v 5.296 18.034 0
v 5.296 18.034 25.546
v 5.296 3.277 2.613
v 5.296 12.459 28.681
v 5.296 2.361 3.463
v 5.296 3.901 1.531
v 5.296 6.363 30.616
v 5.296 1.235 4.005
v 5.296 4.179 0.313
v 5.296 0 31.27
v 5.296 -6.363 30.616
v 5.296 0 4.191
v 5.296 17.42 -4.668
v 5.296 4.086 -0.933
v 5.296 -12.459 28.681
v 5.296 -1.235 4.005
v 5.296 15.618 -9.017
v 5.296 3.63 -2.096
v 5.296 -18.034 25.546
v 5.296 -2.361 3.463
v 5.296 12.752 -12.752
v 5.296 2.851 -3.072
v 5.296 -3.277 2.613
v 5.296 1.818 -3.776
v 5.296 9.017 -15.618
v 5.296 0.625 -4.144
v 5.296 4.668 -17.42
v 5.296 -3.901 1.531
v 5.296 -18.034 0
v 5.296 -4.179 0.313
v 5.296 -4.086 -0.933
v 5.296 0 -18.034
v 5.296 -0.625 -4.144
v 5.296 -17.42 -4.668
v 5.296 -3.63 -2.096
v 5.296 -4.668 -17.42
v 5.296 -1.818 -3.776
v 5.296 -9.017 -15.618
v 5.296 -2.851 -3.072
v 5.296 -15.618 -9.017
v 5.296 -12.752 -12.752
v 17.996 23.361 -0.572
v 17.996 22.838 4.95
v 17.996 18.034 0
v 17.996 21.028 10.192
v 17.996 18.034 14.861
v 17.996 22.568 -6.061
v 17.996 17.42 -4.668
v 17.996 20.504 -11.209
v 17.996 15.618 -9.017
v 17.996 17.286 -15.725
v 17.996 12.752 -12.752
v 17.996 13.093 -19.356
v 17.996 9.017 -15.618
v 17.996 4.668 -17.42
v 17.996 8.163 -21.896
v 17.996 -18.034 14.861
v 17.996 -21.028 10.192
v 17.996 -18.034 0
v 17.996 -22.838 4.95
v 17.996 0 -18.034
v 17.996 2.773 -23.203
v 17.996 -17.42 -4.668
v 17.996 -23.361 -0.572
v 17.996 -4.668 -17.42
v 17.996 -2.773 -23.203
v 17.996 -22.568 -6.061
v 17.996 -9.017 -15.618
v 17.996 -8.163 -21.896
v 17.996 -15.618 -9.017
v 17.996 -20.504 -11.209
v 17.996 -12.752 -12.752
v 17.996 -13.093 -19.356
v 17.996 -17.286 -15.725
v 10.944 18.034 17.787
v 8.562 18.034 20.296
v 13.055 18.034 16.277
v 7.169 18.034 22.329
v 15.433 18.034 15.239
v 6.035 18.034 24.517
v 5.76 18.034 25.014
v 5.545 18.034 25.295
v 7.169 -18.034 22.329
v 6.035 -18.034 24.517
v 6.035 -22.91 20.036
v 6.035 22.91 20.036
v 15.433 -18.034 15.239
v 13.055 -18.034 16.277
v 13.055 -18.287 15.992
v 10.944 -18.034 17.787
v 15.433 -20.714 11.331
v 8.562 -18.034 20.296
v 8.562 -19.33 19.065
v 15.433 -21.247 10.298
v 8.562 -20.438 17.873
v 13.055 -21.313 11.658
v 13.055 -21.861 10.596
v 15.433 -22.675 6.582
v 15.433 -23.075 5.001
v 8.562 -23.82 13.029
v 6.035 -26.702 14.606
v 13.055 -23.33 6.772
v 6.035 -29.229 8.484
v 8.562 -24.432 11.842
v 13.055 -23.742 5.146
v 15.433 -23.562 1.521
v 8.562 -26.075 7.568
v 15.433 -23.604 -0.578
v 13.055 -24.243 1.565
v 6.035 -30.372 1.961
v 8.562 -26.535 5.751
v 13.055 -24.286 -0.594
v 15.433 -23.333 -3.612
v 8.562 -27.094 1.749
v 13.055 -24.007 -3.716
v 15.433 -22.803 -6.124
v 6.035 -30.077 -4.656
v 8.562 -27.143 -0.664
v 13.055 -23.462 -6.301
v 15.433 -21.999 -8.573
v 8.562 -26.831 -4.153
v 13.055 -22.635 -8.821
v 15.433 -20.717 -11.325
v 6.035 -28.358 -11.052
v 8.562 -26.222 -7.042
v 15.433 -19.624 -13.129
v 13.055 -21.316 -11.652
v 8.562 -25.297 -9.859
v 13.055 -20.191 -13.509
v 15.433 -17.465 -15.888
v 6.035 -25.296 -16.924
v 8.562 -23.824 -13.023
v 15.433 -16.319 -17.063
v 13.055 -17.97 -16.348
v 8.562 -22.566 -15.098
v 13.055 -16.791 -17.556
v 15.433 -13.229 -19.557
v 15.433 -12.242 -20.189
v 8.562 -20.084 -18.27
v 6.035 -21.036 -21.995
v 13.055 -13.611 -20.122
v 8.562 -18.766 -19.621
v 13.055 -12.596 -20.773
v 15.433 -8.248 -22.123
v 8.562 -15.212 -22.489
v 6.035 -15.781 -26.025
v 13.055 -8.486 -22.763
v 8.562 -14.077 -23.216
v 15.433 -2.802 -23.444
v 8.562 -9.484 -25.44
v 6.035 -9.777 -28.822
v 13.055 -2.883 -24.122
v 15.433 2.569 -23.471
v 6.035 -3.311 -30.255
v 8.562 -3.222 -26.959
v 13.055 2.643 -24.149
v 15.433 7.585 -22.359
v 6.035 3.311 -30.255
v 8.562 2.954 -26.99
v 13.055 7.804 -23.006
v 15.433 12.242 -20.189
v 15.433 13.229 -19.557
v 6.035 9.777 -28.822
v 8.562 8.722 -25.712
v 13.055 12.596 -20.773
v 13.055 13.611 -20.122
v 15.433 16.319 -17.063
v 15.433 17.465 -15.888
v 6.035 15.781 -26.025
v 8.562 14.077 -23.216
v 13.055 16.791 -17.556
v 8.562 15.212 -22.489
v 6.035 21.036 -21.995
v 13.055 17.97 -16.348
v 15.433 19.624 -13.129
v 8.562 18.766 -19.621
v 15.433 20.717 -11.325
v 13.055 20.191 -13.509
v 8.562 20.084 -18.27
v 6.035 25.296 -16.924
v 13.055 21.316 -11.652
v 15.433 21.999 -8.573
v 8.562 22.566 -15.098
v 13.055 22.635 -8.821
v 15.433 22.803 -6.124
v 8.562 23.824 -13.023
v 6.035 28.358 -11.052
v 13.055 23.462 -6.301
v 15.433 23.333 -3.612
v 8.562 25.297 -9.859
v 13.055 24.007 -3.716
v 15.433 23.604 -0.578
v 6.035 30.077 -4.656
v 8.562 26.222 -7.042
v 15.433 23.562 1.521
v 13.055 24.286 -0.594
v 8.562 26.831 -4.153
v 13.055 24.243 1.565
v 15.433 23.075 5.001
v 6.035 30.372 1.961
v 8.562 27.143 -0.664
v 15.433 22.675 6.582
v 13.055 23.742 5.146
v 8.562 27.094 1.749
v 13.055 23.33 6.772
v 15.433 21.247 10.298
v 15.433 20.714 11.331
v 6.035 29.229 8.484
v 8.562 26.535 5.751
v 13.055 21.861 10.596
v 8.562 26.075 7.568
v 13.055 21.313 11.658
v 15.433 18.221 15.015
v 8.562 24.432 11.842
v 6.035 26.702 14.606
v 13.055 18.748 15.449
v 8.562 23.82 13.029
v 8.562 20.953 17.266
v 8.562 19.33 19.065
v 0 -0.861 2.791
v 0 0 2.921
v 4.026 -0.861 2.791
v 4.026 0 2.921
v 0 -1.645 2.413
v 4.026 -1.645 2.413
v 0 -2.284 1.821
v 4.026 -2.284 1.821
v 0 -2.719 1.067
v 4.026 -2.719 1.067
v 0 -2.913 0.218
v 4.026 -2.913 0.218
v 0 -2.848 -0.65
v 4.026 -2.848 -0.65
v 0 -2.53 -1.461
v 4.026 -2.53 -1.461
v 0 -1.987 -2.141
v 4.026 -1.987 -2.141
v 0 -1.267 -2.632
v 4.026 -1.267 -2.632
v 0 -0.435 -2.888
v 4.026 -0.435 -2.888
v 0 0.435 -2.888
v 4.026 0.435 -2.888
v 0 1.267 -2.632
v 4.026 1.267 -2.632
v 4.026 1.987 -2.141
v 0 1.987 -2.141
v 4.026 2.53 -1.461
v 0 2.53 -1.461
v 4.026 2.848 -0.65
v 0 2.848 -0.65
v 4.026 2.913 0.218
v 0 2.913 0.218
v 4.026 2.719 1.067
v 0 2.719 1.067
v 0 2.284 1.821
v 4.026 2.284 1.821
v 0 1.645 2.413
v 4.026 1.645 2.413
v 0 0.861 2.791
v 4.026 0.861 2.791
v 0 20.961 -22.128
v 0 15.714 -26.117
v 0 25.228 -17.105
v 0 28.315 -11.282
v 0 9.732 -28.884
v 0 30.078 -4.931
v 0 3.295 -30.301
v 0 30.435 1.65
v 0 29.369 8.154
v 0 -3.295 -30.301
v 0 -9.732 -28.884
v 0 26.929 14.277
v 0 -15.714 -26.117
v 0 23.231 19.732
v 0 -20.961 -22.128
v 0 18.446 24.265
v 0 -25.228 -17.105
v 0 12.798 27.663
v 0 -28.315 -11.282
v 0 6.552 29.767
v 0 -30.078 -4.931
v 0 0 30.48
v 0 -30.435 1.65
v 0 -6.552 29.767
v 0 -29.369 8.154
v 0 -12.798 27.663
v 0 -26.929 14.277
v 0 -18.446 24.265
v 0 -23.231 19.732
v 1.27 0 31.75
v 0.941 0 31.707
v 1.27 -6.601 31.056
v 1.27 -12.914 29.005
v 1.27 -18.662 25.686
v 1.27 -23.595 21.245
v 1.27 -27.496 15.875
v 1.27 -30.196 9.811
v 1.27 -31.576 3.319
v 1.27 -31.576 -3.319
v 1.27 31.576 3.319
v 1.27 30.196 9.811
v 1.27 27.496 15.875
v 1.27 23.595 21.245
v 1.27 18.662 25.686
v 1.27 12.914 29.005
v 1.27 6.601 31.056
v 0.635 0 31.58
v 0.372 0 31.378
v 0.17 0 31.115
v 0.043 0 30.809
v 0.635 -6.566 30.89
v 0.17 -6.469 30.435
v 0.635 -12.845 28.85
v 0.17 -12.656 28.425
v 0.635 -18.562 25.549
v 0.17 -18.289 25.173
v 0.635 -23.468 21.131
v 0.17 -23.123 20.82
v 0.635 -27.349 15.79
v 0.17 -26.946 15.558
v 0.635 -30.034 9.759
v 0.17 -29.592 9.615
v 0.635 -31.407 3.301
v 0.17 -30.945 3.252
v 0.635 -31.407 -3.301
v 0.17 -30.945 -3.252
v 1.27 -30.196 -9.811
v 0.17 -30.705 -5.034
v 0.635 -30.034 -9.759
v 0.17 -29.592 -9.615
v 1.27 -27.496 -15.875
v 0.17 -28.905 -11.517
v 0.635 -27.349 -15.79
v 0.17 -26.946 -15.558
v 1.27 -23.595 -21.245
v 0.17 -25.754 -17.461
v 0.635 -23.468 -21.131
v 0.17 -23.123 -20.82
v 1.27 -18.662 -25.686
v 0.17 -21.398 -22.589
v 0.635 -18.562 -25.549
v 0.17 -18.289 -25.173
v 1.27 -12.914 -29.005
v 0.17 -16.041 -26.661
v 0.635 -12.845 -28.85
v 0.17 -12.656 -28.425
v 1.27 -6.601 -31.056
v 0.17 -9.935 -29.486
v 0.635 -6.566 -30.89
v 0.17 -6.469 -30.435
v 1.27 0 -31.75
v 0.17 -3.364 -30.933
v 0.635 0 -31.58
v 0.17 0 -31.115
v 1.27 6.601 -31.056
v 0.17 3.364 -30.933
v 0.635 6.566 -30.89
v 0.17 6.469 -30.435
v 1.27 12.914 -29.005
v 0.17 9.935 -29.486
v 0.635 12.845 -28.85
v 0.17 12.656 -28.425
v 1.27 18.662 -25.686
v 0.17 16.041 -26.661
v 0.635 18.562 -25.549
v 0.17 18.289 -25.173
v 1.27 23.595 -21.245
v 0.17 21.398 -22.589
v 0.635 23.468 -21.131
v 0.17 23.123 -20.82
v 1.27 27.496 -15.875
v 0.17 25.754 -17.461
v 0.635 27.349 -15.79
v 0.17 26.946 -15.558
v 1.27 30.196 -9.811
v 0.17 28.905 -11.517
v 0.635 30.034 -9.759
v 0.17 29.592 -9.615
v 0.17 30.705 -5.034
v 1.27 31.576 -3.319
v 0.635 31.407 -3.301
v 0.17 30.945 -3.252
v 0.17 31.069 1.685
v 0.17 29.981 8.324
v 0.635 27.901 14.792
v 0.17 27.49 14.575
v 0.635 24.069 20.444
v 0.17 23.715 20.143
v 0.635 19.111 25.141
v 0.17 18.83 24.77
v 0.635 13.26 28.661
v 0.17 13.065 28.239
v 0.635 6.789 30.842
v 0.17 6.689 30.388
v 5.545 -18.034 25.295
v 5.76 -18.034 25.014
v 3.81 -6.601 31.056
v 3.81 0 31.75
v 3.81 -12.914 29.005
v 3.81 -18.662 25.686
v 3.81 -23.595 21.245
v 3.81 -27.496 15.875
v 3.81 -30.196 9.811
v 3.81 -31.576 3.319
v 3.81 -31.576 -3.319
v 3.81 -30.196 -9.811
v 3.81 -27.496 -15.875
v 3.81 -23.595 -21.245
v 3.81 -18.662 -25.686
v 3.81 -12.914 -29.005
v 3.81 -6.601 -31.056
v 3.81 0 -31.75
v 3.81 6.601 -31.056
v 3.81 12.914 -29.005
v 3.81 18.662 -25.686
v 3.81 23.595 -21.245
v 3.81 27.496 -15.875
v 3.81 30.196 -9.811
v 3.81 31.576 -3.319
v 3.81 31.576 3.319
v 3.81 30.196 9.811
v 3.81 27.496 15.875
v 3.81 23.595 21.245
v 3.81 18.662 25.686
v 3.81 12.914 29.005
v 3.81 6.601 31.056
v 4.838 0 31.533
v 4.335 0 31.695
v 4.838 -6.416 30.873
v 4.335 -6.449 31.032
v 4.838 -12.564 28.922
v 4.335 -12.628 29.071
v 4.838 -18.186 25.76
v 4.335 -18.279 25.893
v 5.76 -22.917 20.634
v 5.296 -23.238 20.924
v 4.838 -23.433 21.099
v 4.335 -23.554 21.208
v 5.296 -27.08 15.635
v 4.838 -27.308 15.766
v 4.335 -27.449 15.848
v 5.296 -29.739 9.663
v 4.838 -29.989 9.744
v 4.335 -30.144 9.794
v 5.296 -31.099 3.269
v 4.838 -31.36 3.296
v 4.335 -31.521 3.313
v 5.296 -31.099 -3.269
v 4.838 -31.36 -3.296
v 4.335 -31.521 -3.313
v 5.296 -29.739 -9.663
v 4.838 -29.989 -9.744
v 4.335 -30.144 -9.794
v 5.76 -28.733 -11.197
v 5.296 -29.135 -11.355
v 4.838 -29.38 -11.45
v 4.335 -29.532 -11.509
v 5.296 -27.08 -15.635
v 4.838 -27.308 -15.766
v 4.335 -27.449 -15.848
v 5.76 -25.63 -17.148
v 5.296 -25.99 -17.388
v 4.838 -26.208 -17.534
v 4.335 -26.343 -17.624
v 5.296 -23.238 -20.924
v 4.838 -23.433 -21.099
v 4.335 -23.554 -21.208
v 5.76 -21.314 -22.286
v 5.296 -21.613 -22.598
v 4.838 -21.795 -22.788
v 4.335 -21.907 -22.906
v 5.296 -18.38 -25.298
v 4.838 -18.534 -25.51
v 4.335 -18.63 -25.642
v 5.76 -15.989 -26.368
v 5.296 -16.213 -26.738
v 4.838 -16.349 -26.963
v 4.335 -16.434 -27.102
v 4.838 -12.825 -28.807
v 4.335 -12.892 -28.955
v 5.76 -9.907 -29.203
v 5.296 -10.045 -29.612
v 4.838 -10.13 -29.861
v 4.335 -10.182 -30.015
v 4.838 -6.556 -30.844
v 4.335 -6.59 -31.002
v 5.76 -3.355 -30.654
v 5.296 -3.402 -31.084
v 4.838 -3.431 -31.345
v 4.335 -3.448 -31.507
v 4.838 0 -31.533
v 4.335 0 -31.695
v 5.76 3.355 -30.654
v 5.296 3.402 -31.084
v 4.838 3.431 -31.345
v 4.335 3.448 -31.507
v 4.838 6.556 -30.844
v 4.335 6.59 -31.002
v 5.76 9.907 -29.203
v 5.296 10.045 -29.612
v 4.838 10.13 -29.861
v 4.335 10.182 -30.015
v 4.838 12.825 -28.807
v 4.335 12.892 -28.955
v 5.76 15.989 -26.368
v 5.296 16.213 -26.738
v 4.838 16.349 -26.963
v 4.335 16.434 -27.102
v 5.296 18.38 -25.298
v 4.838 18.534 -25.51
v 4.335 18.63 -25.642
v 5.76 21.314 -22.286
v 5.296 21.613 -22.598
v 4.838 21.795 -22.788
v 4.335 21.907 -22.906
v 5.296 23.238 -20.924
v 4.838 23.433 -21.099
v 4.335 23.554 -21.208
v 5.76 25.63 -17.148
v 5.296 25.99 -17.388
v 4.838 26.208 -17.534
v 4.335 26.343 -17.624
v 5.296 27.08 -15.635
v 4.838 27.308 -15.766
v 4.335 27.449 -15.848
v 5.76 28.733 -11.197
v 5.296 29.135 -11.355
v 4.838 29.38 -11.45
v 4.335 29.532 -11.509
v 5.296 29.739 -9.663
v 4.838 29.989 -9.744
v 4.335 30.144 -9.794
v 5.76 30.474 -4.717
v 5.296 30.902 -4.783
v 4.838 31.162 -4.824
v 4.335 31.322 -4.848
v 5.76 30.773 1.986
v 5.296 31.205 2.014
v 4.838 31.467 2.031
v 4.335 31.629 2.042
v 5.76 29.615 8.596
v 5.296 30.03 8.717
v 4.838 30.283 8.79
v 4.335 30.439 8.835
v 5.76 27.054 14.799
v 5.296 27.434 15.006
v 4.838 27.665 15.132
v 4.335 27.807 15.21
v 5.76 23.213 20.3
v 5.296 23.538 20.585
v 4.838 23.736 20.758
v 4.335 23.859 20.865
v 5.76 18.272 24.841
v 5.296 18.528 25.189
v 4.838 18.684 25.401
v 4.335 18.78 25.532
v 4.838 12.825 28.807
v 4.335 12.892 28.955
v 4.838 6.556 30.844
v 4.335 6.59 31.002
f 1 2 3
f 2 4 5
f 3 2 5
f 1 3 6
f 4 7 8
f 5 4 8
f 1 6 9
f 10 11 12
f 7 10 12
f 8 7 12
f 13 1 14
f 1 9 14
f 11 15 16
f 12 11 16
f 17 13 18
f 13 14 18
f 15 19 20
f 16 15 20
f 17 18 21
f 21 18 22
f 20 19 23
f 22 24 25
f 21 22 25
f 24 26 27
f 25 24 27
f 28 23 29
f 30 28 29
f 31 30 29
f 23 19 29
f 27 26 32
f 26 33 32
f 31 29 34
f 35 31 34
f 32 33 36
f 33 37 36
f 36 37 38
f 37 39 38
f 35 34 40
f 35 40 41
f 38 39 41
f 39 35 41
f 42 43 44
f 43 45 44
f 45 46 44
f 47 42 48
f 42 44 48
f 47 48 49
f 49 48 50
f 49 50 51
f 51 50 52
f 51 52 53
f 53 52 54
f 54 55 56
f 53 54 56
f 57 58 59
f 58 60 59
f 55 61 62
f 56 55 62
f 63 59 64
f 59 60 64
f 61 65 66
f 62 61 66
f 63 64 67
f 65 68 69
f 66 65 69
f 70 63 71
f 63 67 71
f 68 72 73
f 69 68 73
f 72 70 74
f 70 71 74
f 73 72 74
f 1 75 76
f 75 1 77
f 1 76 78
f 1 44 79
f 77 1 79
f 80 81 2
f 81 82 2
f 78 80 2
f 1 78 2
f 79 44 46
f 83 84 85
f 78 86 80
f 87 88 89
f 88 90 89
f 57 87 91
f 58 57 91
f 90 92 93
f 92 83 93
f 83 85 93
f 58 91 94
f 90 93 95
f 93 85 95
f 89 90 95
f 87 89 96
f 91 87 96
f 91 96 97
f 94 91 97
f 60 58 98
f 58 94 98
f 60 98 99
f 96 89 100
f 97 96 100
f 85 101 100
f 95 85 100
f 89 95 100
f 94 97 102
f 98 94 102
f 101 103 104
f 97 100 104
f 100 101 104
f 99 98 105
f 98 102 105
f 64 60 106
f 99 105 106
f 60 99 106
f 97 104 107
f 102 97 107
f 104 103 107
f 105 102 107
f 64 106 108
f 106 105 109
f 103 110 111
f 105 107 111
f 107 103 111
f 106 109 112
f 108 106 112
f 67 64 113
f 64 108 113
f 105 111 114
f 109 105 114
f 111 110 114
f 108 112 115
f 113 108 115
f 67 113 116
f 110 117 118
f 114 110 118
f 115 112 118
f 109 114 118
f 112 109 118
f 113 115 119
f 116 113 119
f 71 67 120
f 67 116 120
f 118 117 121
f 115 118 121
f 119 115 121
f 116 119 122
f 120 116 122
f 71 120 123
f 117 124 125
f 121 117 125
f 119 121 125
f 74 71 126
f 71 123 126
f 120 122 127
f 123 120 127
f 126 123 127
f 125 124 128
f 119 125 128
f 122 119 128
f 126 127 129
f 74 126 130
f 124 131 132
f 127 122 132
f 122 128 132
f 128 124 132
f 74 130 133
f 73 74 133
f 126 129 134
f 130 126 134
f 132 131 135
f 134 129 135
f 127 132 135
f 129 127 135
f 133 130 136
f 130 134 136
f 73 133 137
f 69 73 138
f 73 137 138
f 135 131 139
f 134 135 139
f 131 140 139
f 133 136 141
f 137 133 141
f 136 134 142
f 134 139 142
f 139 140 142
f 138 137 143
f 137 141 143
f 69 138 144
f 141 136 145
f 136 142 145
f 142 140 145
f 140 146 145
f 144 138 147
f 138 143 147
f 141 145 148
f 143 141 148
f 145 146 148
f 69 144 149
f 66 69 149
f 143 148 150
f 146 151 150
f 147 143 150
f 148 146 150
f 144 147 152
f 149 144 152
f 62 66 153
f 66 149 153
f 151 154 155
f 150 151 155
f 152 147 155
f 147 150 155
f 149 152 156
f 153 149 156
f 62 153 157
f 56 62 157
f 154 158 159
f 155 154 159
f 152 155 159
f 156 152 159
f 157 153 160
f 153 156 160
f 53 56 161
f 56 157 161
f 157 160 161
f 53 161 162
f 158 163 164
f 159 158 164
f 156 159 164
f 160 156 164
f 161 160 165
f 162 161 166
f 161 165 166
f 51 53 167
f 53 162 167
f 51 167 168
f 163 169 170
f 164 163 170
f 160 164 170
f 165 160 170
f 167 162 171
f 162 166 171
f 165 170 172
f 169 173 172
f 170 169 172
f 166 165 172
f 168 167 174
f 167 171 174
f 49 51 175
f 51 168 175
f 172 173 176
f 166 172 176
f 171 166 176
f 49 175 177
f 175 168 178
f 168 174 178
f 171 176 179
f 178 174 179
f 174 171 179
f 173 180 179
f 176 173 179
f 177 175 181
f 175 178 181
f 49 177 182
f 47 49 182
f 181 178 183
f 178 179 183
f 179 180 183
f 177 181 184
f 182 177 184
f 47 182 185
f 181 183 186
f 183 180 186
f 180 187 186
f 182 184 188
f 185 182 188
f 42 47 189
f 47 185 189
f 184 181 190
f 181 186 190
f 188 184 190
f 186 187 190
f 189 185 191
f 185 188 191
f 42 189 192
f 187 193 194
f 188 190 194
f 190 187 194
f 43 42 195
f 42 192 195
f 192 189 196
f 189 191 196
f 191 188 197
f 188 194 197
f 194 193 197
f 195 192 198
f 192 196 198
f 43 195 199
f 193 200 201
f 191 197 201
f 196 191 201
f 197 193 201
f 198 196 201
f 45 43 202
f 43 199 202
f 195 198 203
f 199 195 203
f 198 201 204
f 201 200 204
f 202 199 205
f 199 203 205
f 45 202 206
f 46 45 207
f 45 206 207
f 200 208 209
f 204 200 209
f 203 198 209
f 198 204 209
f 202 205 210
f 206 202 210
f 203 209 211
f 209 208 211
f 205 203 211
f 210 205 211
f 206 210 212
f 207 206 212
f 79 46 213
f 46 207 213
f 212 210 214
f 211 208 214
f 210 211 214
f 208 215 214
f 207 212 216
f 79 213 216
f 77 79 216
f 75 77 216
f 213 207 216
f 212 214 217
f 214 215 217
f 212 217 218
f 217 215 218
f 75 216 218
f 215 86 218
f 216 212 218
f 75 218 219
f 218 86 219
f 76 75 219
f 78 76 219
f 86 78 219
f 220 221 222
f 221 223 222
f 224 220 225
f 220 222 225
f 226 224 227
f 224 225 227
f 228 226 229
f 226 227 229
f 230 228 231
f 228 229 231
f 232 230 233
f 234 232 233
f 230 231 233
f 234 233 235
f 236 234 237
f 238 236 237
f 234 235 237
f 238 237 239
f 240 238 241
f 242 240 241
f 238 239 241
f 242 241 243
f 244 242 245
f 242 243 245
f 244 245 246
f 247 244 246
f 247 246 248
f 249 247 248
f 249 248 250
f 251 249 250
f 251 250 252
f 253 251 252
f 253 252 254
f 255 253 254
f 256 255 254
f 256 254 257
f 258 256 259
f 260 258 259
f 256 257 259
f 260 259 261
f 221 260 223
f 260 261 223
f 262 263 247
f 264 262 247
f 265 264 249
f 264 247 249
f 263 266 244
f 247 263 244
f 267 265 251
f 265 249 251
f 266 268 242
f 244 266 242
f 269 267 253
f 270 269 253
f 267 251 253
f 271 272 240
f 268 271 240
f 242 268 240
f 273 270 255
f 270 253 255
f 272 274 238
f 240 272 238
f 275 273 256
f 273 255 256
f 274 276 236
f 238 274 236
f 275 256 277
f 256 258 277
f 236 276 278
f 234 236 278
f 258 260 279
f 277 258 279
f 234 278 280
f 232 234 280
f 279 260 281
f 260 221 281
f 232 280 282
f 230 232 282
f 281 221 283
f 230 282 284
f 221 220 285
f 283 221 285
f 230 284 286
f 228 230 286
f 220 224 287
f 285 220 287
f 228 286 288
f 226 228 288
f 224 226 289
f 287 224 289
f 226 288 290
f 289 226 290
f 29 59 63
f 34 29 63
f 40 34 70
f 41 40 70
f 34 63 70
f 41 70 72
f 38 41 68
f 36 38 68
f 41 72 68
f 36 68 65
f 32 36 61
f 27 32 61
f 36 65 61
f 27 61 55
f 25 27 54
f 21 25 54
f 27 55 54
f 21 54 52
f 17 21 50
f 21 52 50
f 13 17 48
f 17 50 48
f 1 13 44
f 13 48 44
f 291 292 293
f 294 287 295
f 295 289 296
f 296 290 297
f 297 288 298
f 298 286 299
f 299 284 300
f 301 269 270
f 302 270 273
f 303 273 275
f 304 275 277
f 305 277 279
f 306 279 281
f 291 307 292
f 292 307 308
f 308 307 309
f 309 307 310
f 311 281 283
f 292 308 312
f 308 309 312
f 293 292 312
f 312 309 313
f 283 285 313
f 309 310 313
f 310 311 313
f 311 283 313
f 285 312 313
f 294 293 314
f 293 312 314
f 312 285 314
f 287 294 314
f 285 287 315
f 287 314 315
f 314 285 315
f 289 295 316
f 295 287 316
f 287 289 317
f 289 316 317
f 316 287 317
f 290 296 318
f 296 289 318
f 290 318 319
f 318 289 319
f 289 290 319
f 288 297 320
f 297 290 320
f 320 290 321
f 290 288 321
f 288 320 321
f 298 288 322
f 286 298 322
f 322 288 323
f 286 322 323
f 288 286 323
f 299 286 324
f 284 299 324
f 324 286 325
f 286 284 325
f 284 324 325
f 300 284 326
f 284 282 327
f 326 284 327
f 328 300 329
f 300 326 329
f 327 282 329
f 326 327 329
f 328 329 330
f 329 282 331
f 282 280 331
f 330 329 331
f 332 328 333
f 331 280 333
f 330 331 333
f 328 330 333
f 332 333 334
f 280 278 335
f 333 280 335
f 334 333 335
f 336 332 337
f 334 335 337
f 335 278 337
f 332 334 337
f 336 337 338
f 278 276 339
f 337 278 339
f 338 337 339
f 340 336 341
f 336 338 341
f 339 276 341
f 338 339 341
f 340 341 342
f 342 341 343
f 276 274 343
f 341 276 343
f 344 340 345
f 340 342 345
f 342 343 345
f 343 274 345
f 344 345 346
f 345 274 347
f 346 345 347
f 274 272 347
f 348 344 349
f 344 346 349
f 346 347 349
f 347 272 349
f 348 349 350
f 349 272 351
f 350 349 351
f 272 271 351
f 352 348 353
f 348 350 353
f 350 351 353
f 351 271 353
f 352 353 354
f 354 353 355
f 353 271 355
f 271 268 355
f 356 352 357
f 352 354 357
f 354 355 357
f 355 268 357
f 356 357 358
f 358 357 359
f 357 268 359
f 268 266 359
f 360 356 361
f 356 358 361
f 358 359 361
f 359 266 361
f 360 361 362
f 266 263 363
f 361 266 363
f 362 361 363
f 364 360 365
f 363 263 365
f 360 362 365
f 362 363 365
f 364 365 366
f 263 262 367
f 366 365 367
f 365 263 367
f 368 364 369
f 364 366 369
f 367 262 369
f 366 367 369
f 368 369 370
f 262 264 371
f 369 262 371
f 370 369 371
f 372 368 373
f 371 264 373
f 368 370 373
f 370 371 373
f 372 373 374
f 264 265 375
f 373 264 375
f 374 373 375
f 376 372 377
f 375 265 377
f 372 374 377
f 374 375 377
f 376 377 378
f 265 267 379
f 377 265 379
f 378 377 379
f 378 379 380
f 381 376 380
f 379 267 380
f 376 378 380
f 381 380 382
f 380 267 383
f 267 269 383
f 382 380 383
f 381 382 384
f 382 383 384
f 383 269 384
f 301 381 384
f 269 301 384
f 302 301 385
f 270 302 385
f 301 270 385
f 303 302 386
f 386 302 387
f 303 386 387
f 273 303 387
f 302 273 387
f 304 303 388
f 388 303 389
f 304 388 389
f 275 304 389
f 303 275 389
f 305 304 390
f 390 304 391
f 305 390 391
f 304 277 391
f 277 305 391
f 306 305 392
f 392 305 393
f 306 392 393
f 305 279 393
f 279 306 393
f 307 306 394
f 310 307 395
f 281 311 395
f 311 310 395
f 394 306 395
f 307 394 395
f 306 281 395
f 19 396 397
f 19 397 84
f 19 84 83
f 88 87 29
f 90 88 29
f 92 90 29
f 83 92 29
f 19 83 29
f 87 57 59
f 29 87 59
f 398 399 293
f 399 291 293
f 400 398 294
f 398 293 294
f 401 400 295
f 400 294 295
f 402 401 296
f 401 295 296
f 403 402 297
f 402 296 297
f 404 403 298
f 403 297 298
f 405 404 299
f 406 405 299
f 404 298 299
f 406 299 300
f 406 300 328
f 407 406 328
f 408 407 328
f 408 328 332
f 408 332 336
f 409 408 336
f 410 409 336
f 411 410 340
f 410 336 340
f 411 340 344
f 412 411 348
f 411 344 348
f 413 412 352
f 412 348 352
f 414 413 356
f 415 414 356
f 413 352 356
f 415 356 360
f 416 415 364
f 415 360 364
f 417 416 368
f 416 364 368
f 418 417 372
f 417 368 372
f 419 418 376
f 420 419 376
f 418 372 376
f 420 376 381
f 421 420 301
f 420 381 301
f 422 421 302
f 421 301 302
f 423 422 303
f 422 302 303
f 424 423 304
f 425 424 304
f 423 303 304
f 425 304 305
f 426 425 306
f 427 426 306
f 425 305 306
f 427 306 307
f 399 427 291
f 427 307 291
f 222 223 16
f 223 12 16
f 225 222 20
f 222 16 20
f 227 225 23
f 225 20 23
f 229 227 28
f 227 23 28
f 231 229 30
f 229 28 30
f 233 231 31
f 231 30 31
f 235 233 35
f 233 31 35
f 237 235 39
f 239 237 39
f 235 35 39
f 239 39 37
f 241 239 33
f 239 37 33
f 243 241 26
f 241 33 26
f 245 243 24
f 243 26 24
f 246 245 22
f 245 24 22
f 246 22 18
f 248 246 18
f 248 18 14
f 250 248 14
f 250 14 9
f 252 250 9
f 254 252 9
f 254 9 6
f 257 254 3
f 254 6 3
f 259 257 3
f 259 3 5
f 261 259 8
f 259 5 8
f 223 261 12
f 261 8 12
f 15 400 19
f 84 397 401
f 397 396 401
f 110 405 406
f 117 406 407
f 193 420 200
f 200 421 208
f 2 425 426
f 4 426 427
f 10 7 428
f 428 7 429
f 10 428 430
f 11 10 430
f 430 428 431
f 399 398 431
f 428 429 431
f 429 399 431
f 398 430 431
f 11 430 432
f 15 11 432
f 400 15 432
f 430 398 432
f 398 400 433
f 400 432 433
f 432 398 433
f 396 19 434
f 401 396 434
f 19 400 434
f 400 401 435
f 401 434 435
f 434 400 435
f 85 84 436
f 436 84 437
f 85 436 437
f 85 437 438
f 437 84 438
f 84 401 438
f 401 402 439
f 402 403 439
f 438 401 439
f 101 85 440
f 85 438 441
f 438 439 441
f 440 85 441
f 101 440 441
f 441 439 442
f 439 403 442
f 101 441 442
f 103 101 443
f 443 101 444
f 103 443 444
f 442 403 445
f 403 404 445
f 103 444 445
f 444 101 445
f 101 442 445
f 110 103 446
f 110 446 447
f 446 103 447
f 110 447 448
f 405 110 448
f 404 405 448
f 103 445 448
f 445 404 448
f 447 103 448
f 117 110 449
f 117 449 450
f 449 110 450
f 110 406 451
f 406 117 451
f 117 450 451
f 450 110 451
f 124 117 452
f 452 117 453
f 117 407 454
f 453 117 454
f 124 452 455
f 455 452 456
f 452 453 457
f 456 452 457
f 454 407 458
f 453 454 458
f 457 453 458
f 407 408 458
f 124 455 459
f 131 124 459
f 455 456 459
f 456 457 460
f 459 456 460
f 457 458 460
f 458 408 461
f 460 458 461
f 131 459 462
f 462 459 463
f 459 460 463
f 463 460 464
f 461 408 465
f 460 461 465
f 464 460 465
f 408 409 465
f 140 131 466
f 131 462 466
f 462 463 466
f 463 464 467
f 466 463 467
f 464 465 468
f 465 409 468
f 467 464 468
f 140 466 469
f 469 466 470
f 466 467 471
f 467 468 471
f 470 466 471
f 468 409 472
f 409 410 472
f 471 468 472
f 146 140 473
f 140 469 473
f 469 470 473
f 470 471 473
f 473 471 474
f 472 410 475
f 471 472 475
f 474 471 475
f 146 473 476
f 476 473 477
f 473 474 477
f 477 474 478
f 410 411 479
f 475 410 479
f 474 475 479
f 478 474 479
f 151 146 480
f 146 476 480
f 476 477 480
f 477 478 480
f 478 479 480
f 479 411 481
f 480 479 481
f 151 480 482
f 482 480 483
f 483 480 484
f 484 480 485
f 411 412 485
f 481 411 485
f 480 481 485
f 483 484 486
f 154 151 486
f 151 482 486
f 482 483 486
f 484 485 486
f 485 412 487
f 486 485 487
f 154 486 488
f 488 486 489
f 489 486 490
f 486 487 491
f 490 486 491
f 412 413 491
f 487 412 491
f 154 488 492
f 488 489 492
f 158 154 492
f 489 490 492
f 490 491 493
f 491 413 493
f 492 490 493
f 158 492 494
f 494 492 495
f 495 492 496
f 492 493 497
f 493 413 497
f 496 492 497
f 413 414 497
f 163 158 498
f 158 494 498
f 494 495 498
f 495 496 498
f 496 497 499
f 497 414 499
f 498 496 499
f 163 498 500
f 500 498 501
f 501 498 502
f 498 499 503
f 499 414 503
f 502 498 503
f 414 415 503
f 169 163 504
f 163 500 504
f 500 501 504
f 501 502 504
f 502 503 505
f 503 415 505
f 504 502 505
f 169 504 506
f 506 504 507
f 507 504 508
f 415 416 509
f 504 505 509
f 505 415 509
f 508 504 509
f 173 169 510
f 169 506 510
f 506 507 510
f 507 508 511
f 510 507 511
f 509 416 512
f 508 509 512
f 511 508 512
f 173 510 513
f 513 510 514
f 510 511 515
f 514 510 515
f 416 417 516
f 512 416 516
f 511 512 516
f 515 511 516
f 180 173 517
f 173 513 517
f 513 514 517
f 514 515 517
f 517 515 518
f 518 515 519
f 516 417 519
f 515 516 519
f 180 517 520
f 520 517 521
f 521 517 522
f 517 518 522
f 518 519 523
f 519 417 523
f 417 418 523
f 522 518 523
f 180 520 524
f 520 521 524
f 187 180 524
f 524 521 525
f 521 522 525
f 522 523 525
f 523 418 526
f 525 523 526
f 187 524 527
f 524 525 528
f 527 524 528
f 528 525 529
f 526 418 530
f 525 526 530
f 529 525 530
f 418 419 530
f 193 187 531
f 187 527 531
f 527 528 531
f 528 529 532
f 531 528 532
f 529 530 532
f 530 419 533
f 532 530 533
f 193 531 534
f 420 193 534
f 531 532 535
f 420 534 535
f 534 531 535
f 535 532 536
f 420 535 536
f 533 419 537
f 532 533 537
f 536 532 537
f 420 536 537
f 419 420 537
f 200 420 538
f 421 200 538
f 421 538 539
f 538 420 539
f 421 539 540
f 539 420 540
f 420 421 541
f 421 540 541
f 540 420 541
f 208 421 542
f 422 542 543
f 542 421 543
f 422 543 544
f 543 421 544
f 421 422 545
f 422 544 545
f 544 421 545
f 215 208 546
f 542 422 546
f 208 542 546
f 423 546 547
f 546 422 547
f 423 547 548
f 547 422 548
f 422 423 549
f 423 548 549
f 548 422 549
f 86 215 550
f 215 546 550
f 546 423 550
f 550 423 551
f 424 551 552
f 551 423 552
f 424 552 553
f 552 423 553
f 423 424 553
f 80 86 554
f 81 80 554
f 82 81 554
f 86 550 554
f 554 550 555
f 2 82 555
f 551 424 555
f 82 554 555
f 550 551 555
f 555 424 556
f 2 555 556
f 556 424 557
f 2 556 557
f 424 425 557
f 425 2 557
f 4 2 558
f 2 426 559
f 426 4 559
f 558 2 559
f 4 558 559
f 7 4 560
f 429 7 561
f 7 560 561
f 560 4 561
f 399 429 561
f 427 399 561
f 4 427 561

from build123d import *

# Parameters (mm, degrees)
F3_DEPTH = 12.7


with BuildPart() as f1:
    # F0 (on Front) → F1 (revolve)
    with BuildSketch(Plane.XZ):
        with BuildLine():
            Line((0, 30.48), (0, 2.921))
            Line((0, 2.921), (4.02617, 2.921))
            Line((4.02617, 2.921), (5.29617, 4.191))
            Line((5.29617, 4.191), (5.29617, 18.034))
            Line((5.29617, 18.034), (17.99617, 18.034))
            Line((17.99617, 18.034), (17.99617, 23.368))
            ThreePointArc((17.99617, 23.368), (11.049548, 25.266883), (6.034837, 30.435439))
            ThreePointArc((6.034837, 30.435439), (5.102088, 31.396803), (3.81, 31.75))
            Line((3.81, 31.75), (1.27, 31.75))
            ThreePointArc((1.27, 31.75), (0.371974, 31.378026), (0, 30.48))
        make_face()
    revolve(axis=Axis((18.239362, 0, 0), (1, 0, 0)))

    # F2 (on face) → F3 (cut, through all)
    with BuildSketch(Plane.YZ.offset(17.99617)):
        with BuildLine():
            Line((-18.034, 36.491495), (-18.034, 0))
            ThreePointArc((-18.034, 0), (0, -18.034), (18.034, 0))
            Line((18.034, 0), (18.034, 36.491495))
            Line((18.034, 36.491495), (-18.034, 36.491495))
        make_face()
    extrude(amount=-F3_DEPTH, mode=Mode.SUBTRACT)


solid = f1.part
